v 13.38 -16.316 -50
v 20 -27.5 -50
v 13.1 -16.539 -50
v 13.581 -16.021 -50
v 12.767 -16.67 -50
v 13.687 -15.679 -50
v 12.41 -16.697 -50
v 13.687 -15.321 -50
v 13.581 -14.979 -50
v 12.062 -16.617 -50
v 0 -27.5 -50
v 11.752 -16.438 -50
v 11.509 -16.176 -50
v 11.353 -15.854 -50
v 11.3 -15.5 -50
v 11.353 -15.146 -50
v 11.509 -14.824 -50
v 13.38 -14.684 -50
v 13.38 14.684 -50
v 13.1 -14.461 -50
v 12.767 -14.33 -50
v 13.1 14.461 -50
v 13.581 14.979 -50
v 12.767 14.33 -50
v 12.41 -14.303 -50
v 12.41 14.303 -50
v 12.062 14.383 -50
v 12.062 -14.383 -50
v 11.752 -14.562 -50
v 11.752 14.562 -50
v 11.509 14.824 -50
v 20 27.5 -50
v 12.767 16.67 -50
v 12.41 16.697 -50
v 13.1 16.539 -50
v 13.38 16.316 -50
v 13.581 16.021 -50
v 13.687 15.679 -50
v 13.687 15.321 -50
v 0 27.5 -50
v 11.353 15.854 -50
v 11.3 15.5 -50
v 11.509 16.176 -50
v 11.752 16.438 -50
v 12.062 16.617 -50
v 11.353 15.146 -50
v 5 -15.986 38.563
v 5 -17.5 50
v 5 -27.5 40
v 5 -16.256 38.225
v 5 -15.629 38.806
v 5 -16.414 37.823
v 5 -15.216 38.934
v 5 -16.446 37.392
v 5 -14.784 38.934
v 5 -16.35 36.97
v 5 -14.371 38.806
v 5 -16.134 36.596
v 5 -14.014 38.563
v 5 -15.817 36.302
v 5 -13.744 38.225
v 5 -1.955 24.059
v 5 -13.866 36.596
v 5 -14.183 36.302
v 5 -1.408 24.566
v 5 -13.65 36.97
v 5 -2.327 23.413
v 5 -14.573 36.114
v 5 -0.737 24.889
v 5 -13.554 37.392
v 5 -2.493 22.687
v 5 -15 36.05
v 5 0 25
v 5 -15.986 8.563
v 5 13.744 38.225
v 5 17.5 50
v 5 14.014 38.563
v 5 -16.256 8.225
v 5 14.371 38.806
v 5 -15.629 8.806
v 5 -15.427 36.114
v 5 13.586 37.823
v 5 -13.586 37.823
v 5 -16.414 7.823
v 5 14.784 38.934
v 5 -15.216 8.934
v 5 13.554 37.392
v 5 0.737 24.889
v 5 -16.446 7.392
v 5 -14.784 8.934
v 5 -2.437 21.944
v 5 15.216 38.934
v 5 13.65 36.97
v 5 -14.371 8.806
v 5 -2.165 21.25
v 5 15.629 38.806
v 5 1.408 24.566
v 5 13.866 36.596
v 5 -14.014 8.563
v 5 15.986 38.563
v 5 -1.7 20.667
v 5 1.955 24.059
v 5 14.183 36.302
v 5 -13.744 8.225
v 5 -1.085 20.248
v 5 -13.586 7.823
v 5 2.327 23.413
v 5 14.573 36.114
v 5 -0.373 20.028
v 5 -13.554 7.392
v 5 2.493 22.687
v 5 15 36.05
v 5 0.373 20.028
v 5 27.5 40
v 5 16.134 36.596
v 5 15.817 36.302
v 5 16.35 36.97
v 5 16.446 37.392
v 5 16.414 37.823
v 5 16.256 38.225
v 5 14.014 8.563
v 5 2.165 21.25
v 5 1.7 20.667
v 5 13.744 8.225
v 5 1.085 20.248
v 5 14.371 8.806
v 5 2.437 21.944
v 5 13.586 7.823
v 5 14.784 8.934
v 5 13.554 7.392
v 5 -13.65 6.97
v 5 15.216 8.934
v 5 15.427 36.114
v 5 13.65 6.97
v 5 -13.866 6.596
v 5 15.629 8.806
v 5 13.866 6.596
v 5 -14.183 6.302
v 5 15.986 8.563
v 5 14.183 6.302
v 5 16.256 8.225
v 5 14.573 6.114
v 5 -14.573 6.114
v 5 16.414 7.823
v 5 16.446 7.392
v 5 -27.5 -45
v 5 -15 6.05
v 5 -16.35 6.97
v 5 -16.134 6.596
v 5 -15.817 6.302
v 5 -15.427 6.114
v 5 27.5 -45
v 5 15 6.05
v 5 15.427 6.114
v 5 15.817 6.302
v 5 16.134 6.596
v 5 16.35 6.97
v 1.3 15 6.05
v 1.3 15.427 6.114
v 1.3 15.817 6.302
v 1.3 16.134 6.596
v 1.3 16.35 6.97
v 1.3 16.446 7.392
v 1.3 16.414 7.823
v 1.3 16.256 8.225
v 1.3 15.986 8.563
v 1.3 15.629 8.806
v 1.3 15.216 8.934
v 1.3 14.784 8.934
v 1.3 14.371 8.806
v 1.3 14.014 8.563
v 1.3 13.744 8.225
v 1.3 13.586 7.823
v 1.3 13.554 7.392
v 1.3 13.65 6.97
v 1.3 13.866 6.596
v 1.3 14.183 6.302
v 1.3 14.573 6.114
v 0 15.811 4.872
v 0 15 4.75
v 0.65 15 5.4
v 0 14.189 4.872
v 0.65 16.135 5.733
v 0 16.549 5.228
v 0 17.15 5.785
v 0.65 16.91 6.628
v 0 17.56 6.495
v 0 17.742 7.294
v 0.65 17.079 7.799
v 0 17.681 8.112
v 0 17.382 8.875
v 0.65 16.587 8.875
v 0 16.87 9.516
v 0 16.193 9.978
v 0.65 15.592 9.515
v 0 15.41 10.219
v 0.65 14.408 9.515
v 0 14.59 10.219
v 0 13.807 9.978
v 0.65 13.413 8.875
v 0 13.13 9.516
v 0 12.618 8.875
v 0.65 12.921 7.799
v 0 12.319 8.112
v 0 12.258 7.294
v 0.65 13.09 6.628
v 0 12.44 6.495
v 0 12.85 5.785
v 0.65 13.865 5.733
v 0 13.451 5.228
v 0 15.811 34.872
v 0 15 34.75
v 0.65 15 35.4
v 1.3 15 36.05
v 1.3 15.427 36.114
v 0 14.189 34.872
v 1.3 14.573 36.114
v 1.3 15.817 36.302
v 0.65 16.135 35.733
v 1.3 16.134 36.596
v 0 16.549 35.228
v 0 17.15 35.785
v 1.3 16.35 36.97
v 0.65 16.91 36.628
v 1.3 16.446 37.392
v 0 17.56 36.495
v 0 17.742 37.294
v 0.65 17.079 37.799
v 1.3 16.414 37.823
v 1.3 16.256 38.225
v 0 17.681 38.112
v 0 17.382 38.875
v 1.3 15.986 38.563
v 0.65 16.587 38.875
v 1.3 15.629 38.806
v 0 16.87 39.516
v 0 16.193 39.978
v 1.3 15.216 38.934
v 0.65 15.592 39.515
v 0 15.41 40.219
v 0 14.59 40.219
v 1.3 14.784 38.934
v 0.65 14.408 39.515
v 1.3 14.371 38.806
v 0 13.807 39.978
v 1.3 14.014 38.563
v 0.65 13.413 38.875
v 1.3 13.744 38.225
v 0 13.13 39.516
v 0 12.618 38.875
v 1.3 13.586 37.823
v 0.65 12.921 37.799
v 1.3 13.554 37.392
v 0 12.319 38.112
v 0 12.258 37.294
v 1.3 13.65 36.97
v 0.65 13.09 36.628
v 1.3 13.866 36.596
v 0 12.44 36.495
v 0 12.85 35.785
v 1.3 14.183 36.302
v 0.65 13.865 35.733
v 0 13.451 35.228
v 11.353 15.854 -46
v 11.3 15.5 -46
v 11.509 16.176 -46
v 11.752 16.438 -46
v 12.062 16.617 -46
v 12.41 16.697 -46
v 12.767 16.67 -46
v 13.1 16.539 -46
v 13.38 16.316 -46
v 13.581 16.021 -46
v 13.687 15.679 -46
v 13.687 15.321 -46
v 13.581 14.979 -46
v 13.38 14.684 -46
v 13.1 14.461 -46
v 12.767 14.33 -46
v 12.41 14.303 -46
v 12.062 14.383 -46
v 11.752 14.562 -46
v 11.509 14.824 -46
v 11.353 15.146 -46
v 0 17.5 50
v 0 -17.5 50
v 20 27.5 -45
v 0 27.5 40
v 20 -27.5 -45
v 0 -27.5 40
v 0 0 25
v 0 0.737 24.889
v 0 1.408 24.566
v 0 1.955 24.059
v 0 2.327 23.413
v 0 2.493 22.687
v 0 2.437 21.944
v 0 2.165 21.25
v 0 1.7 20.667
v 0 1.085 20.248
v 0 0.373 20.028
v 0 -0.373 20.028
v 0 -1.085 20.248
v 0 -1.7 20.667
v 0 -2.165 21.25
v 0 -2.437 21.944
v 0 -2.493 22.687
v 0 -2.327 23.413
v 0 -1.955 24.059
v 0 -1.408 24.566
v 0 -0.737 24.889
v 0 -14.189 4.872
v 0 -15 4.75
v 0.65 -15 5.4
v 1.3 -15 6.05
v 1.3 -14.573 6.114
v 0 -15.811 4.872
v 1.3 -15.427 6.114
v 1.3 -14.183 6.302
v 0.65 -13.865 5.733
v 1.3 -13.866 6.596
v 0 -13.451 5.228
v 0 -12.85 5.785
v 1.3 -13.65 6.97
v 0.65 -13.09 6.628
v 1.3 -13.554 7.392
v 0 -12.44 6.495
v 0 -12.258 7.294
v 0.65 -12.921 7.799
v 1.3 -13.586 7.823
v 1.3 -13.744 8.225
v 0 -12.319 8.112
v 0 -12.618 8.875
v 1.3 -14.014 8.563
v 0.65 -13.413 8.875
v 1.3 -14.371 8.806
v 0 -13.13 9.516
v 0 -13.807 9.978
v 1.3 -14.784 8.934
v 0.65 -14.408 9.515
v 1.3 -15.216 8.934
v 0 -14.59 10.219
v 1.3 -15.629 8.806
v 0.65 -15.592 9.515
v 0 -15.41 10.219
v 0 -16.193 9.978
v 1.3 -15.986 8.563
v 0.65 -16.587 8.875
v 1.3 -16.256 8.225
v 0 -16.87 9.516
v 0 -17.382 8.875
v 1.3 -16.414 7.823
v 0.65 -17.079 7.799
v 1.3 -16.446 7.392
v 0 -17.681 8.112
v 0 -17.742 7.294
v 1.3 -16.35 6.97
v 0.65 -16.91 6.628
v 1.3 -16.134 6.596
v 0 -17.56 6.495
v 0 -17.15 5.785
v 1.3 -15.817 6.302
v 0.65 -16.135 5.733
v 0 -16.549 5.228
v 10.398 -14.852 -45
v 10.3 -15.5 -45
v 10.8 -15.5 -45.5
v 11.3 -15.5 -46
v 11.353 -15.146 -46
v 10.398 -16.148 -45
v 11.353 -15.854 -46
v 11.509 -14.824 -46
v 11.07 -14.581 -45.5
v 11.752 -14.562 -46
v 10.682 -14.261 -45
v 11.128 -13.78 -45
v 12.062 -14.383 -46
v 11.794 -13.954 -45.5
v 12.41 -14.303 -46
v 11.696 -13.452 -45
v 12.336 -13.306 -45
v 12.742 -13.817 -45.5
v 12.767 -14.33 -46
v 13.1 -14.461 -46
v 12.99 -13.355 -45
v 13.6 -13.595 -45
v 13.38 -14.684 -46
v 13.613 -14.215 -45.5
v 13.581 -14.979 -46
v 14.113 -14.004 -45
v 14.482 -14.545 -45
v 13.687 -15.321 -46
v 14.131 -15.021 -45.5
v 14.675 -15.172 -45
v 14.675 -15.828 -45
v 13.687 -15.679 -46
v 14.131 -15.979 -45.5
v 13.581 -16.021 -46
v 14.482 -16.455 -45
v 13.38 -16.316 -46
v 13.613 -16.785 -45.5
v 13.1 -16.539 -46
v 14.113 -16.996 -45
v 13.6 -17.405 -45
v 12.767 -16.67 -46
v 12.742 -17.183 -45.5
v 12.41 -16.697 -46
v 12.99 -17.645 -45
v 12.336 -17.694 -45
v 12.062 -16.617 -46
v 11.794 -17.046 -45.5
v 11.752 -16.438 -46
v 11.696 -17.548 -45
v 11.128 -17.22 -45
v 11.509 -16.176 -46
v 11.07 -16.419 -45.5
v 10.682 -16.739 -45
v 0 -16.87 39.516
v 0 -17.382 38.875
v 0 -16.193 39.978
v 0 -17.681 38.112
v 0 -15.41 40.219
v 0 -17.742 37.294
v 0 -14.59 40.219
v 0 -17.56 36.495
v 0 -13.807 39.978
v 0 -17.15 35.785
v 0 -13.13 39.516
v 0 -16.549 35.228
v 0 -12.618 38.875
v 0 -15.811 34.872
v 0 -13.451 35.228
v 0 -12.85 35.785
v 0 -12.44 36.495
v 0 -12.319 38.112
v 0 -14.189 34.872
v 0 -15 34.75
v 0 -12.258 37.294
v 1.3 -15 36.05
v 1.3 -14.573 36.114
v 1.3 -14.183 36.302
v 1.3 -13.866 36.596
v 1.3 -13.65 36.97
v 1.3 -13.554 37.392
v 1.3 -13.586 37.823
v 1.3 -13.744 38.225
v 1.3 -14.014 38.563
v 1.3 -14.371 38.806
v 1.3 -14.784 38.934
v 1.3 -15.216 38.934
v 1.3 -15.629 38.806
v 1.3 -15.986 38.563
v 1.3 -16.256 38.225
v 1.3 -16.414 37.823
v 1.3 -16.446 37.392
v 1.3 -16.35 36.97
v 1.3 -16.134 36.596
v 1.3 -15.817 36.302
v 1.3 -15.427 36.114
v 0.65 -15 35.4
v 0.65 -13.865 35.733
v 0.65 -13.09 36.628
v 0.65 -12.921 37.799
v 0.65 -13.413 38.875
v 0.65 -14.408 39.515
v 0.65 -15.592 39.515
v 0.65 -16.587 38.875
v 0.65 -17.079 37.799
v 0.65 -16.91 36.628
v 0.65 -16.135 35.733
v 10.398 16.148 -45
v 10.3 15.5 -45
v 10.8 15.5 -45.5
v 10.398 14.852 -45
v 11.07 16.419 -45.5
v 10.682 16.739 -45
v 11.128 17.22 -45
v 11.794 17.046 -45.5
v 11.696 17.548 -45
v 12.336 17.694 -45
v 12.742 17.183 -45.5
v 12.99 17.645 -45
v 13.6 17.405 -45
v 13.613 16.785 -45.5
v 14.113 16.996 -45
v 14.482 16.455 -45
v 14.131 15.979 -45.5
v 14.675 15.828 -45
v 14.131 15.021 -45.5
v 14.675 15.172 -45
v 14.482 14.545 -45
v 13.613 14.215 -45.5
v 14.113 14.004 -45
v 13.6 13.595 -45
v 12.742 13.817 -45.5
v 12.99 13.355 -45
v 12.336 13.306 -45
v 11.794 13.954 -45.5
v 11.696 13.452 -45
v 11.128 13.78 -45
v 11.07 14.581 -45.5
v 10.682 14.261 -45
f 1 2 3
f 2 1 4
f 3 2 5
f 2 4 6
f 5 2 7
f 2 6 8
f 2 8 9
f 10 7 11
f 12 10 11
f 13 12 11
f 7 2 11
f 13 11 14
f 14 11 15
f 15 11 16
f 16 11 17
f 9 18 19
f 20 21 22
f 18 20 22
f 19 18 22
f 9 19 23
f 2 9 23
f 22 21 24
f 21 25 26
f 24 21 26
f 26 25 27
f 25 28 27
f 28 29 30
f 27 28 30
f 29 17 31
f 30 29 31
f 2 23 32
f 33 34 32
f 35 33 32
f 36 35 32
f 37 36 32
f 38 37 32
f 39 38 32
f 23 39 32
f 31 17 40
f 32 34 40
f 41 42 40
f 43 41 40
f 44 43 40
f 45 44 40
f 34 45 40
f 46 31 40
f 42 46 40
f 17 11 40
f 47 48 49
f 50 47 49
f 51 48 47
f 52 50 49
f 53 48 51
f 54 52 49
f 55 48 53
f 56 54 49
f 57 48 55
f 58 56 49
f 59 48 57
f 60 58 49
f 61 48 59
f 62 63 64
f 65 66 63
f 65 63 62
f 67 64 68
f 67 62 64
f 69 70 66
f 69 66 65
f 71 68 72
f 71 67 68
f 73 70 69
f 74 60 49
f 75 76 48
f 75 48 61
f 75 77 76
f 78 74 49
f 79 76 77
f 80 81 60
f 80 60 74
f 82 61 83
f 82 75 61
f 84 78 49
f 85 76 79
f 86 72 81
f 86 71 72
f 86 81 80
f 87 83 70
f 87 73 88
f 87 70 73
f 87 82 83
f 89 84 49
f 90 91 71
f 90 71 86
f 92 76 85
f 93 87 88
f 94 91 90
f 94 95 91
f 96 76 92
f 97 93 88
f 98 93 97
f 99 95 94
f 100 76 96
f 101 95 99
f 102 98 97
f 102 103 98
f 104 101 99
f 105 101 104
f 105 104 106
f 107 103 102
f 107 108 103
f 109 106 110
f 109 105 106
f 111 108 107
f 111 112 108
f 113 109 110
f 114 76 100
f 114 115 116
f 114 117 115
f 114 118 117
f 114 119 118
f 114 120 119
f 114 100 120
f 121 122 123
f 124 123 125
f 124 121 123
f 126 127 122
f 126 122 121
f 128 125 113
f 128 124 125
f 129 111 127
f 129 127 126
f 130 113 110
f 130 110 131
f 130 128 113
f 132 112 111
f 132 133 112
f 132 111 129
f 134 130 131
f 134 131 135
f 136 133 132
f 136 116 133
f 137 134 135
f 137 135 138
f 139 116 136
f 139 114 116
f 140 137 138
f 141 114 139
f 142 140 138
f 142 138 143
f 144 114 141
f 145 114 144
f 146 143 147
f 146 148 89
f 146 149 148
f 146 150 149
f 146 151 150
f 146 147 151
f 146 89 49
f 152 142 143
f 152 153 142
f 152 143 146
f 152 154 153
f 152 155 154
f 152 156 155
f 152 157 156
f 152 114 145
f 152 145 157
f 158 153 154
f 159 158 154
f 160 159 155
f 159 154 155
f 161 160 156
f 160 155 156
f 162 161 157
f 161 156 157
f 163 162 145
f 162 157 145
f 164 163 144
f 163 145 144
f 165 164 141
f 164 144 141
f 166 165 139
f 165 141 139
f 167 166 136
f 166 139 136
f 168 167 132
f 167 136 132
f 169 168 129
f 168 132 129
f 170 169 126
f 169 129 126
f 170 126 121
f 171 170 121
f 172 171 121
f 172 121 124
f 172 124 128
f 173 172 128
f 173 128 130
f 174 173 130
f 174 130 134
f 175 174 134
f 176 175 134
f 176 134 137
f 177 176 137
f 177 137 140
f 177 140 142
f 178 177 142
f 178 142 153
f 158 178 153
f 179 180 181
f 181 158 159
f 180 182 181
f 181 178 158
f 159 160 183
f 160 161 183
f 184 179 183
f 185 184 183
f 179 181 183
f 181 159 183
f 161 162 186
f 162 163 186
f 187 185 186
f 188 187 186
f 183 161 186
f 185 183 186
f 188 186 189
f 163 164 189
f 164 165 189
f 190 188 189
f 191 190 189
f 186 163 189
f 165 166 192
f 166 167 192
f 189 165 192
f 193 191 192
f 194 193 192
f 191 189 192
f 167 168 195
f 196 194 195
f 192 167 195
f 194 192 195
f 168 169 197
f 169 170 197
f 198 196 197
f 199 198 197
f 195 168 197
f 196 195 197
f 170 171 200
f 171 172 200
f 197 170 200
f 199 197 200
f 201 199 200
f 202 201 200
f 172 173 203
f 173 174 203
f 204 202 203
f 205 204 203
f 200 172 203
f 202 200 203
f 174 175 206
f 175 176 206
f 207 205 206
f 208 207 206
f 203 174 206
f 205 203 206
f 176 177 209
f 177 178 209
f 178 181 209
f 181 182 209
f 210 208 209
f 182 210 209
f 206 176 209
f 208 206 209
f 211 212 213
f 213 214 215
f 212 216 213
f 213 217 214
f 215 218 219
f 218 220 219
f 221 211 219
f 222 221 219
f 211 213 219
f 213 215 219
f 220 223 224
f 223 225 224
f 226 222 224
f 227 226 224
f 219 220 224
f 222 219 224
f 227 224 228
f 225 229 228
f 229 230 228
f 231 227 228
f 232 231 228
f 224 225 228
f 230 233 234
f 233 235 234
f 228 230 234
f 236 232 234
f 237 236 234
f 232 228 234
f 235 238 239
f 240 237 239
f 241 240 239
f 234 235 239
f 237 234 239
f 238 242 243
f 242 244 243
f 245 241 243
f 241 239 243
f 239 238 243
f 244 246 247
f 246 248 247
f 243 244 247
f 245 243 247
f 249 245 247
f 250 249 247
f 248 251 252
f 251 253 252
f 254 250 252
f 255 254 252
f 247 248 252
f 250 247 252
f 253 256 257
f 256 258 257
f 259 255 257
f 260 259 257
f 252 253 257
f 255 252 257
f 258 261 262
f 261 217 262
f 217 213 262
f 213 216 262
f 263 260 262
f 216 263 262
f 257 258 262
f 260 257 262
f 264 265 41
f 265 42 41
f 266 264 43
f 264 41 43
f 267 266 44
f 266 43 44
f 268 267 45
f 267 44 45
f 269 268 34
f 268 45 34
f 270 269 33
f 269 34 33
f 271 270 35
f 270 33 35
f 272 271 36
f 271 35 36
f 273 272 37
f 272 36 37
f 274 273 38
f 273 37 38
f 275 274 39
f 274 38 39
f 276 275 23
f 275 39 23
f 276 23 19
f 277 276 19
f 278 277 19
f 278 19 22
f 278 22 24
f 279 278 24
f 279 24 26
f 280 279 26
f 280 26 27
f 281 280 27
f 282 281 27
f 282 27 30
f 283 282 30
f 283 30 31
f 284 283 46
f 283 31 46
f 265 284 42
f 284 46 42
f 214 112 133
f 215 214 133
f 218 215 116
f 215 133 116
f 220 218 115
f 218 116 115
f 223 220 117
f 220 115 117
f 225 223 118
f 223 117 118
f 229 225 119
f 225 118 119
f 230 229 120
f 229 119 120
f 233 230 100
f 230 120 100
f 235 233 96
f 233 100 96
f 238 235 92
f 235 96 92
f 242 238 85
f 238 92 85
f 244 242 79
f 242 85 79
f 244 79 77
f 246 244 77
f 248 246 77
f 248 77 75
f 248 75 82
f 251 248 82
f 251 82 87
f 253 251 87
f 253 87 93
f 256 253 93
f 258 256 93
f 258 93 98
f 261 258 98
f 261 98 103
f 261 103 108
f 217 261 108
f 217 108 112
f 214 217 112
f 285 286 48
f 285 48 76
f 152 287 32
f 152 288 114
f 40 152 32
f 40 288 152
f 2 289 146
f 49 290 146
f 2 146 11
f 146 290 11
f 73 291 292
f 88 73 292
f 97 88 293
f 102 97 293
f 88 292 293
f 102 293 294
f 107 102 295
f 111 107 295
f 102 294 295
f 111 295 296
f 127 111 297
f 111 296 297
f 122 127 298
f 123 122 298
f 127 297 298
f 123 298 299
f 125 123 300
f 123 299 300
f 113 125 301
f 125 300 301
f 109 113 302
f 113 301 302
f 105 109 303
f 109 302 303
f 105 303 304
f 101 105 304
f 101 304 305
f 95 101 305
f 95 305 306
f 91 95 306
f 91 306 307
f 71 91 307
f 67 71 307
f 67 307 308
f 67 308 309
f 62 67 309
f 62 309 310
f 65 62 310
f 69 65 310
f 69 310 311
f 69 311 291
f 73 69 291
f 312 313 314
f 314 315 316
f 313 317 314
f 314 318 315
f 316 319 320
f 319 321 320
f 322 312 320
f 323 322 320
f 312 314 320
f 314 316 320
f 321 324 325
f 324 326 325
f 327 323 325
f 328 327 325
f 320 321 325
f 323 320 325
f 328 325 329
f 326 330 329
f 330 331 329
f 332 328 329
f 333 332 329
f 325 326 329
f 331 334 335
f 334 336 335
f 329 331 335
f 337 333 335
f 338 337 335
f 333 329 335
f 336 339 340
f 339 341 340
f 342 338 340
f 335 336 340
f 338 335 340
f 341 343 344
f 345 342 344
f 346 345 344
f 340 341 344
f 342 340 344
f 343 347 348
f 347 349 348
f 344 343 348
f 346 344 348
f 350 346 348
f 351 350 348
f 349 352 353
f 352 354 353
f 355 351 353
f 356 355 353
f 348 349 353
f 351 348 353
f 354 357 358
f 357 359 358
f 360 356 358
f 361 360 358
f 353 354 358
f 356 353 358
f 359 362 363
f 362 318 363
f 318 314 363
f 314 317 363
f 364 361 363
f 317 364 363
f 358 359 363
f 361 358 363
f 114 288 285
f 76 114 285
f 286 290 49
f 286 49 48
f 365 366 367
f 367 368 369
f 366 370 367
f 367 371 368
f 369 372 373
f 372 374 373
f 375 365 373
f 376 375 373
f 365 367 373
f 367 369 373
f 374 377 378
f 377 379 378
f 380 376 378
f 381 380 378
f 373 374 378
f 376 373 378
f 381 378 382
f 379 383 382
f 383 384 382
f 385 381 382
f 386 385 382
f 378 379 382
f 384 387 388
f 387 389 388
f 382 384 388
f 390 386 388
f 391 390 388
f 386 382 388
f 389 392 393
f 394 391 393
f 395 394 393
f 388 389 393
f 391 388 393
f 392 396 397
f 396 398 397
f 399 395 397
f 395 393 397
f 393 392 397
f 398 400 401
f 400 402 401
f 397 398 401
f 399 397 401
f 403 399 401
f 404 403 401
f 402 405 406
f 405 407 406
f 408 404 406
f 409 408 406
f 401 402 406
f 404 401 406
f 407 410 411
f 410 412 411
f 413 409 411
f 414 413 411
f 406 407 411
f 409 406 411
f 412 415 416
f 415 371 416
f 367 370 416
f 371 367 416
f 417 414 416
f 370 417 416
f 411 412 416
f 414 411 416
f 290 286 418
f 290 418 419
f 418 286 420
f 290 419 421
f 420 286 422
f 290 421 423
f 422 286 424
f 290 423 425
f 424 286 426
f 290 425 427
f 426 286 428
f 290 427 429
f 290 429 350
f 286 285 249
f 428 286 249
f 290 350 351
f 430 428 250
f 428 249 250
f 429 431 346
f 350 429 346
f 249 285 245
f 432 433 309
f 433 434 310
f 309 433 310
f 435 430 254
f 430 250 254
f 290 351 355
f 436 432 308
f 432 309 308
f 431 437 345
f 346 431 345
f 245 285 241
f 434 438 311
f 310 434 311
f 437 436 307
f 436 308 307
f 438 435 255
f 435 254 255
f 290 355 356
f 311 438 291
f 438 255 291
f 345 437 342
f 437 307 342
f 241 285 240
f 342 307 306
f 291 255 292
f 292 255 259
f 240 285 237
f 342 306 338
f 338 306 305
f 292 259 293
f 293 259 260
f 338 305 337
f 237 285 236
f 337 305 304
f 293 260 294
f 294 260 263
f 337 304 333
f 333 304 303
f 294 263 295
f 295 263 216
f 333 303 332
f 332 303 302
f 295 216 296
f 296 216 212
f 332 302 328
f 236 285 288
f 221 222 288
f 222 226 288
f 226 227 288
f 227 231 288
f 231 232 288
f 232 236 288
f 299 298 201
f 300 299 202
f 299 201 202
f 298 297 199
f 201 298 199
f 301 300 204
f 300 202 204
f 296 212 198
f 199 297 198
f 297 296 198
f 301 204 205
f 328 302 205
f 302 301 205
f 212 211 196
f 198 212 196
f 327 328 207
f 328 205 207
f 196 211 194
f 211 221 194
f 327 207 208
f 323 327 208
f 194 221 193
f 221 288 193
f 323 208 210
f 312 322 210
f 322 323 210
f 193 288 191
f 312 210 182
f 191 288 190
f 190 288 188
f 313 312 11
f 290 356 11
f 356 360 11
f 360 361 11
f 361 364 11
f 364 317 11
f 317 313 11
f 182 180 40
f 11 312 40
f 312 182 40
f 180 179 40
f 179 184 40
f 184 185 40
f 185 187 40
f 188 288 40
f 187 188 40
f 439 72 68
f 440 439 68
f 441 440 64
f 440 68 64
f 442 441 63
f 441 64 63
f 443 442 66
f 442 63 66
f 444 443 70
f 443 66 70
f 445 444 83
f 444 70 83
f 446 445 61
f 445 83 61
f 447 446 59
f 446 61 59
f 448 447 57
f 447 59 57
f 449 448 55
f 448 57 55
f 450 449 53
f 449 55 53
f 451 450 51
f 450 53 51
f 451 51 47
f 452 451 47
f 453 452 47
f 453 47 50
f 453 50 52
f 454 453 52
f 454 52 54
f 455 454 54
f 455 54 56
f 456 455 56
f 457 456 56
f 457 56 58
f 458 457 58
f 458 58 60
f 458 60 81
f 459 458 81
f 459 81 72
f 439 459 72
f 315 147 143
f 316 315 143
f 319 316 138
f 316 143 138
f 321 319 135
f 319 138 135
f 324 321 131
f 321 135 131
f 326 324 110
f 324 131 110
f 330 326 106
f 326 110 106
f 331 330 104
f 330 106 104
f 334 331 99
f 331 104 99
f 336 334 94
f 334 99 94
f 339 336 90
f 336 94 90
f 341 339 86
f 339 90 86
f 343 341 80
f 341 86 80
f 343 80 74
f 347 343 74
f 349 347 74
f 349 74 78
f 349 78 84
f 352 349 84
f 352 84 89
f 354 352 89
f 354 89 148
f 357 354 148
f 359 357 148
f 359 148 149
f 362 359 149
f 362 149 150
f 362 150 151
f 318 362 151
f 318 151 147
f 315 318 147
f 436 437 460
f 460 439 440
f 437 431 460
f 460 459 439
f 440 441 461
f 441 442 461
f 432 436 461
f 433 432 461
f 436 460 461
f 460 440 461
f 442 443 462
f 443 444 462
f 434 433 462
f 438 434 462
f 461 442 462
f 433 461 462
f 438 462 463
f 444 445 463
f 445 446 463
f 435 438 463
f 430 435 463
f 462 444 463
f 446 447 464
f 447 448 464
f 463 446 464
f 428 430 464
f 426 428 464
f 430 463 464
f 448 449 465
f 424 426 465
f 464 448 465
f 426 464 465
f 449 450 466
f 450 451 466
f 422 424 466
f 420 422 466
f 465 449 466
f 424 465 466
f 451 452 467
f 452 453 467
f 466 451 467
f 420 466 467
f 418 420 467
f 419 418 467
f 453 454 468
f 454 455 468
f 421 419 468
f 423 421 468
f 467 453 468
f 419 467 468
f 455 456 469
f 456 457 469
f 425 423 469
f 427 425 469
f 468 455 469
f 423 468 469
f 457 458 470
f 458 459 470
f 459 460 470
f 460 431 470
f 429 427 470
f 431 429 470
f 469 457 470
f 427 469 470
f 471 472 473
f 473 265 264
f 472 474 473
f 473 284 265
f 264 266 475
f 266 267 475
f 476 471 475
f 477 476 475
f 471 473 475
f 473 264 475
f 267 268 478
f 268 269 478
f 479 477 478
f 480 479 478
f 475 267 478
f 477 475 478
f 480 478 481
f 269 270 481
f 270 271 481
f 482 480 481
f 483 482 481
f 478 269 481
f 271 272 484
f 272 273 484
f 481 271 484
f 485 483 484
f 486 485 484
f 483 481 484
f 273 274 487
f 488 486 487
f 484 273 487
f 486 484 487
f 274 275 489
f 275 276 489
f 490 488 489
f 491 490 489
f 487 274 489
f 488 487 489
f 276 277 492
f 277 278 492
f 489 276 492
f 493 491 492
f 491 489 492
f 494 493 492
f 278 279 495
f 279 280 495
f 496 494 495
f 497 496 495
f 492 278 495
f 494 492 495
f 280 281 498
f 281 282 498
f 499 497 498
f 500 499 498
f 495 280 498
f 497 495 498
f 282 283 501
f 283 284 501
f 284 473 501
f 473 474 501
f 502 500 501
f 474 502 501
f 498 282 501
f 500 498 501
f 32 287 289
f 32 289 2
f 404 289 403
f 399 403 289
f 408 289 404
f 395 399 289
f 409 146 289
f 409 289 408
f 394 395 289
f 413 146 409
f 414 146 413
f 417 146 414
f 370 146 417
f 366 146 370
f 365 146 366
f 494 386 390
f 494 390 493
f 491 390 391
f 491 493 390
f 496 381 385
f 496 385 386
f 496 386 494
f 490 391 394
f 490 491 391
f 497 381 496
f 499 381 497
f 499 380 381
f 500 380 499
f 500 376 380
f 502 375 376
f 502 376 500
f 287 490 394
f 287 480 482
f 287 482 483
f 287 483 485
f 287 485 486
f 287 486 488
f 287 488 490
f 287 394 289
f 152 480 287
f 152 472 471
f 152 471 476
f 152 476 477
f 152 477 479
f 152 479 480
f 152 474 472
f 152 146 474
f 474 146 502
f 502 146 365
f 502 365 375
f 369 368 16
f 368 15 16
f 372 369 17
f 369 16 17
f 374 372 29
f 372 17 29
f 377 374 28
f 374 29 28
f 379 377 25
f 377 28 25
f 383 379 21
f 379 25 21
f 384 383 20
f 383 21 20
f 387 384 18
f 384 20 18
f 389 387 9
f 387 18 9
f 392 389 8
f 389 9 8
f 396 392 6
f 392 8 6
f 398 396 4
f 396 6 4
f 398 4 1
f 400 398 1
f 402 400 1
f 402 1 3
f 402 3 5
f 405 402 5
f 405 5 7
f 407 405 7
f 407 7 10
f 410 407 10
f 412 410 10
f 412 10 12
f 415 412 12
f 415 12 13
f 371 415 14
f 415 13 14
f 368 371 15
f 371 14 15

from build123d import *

# Parameters (mm, degrees)
SKETCH1_W                                         = 100
SKETCH1_H                                         = 55
BOSS_EXTRUDE1_DEPTH                               = 5
SKETCH2_W                                         = 5
SKETCH2_H                                         = 55
BOSS_EXTRUDE2_DEPTH                               = 15
CUT_EXTRUDE1_REACH                                = 22
CSK_FOR_M2_FLAT_HEAD_MACHINE_SCREW1_D             = 2.4
CSK_FOR_M2_FLAT_HEAD_MACHINE_SCREW1_CSINK_D       = 4.4
CSK_FOR_M2_FLAT_HEAD_MACHINE_SCREW1_CSINK_ANGLE   = 90
CUT_EXTRUDE2_REACH                                = 22
SKETCH6_R                                         = 2.5
CSK_FOR_M2_5_FLAT_HEAD_MACHINE_SCREW1_D           = 2.9
CSK_FOR_M2_5_FLAT_HEAD_MACHINE_SCREW1_DEPTH       = 5
CSK_FOR_M2_5_FLAT_HEAD_MACHINE_SCREW1_CSINK_D     = 5.5
CSK_FOR_M2_5_FLAT_HEAD_MACHINE_SCREW1_CSINK_ANGLE = 90


with BuildPart() as part:
    # Sketch1 → Boss-Extrude1 (new body)
    with BuildSketch(Plane(origin=(0, 0, 0), x_dir=(0, 0, -1), z_dir=(1, 0, 0))):
        Rectangle(SKETCH1_W, SKETCH1_H)
    extrude(amount=BOSS_EXTRUDE1_DEPTH)

    # Sketch2 → Boss-Extrude2 (add)
    with BuildSketch(Plane(origin=(5, 0, 0), x_dir=(0, 0, -1), z_dir=(1, 0, 0))):
        with Locations((47.5, 0)):
            Rectangle(SKETCH2_W, SKETCH2_H)
    extrude(amount=BOSS_EXTRUDE2_DEPTH)

    # Sketch3 → Cut-Extrude1 (cut, up to next)
    with BuildSketch(Plane.ZY, mode=Mode.PRIVATE) as cut_extrude1_sk1:
        Polygon((50, 27.5), (40, 27.5), (50, 17.5), align=None)
    cut_extrude1_tool1 = extrude(cut_extrude1_sk1.sketch, amount=-CUT_EXTRUDE1_REACH, mode=Mode.PRIVATE) & part.part
    add(cut_extrude1_tool1.solids().sort_by_distance((0, 24.166667, 46.666667))[0], mode=Mode.SUBTRACT)
    # Sketch3 → Cut-Extrude1 (cut, up to next)
    with BuildSketch(Plane.ZY, mode=Mode.PRIVATE) as cut_extrude1_sk2:
        Polygon((50, -27.5), (40, -27.5), (50, -17.5), align=None)
    cut_extrude1_tool2 = extrude(cut_extrude1_sk2.sketch, amount=-CUT_EXTRUDE1_REACH, mode=Mode.PRIVATE) & part.part
    add(cut_extrude1_tool2.solids().sort_by_distance((0, -24.166667, 46.666667))[0], mode=Mode.SUBTRACT)

    # CSK for M2 Flat Head Machine Screw1 (through all)
    with Locations(Plane.XY.offset(-45)):
        with Locations((12.5, 15.5), (12.5, -15.5)):
            CounterSinkHole(CSK_FOR_M2_FLAT_HEAD_MACHINE_SCREW1_D / 2, CSK_FOR_M2_FLAT_HEAD_MACHINE_SCREW1_CSINK_D / 2, counter_sink_angle=CSK_FOR_M2_FLAT_HEAD_MACHINE_SCREW1_CSINK_ANGLE)

    # Sketch6 → Cut-Extrude2 (cut, up to next)
    with BuildSketch(Plane.ZY, mode=Mode.PRIVATE) as cut_extrude2_sk1:
        with Locations((22.5, 0)):
            Circle(SKETCH6_R)
    cut_extrude2_tool1 = extrude(cut_extrude2_sk1.sketch, amount=-CUT_EXTRUDE2_REACH, mode=Mode.PRIVATE) & part.part
    add(cut_extrude2_tool1.solids().sort_by_distance((0, 0, 22.5))[0], mode=Mode.SUBTRACT)

    # CSK for M2.5 Flat Head Machine Screw1
    with Locations(Plane.ZY):
        with Locations((7.5, 15), (7.5, -15), (37.5, -15), (37.5, 15)):
            CounterSinkHole(CSK_FOR_M2_5_FLAT_HEAD_MACHINE_SCREW1_D / 2, CSK_FOR_M2_5_FLAT_HEAD_MACHINE_SCREW1_CSINK_D / 2, depth=CSK_FOR_M2_5_FLAT_HEAD_MACHINE_SCREW1_DEPTH, counter_sink_angle=CSK_FOR_M2_5_FLAT_HEAD_MACHINE_SCREW1_CSINK_ANGLE)


solid = part.part
